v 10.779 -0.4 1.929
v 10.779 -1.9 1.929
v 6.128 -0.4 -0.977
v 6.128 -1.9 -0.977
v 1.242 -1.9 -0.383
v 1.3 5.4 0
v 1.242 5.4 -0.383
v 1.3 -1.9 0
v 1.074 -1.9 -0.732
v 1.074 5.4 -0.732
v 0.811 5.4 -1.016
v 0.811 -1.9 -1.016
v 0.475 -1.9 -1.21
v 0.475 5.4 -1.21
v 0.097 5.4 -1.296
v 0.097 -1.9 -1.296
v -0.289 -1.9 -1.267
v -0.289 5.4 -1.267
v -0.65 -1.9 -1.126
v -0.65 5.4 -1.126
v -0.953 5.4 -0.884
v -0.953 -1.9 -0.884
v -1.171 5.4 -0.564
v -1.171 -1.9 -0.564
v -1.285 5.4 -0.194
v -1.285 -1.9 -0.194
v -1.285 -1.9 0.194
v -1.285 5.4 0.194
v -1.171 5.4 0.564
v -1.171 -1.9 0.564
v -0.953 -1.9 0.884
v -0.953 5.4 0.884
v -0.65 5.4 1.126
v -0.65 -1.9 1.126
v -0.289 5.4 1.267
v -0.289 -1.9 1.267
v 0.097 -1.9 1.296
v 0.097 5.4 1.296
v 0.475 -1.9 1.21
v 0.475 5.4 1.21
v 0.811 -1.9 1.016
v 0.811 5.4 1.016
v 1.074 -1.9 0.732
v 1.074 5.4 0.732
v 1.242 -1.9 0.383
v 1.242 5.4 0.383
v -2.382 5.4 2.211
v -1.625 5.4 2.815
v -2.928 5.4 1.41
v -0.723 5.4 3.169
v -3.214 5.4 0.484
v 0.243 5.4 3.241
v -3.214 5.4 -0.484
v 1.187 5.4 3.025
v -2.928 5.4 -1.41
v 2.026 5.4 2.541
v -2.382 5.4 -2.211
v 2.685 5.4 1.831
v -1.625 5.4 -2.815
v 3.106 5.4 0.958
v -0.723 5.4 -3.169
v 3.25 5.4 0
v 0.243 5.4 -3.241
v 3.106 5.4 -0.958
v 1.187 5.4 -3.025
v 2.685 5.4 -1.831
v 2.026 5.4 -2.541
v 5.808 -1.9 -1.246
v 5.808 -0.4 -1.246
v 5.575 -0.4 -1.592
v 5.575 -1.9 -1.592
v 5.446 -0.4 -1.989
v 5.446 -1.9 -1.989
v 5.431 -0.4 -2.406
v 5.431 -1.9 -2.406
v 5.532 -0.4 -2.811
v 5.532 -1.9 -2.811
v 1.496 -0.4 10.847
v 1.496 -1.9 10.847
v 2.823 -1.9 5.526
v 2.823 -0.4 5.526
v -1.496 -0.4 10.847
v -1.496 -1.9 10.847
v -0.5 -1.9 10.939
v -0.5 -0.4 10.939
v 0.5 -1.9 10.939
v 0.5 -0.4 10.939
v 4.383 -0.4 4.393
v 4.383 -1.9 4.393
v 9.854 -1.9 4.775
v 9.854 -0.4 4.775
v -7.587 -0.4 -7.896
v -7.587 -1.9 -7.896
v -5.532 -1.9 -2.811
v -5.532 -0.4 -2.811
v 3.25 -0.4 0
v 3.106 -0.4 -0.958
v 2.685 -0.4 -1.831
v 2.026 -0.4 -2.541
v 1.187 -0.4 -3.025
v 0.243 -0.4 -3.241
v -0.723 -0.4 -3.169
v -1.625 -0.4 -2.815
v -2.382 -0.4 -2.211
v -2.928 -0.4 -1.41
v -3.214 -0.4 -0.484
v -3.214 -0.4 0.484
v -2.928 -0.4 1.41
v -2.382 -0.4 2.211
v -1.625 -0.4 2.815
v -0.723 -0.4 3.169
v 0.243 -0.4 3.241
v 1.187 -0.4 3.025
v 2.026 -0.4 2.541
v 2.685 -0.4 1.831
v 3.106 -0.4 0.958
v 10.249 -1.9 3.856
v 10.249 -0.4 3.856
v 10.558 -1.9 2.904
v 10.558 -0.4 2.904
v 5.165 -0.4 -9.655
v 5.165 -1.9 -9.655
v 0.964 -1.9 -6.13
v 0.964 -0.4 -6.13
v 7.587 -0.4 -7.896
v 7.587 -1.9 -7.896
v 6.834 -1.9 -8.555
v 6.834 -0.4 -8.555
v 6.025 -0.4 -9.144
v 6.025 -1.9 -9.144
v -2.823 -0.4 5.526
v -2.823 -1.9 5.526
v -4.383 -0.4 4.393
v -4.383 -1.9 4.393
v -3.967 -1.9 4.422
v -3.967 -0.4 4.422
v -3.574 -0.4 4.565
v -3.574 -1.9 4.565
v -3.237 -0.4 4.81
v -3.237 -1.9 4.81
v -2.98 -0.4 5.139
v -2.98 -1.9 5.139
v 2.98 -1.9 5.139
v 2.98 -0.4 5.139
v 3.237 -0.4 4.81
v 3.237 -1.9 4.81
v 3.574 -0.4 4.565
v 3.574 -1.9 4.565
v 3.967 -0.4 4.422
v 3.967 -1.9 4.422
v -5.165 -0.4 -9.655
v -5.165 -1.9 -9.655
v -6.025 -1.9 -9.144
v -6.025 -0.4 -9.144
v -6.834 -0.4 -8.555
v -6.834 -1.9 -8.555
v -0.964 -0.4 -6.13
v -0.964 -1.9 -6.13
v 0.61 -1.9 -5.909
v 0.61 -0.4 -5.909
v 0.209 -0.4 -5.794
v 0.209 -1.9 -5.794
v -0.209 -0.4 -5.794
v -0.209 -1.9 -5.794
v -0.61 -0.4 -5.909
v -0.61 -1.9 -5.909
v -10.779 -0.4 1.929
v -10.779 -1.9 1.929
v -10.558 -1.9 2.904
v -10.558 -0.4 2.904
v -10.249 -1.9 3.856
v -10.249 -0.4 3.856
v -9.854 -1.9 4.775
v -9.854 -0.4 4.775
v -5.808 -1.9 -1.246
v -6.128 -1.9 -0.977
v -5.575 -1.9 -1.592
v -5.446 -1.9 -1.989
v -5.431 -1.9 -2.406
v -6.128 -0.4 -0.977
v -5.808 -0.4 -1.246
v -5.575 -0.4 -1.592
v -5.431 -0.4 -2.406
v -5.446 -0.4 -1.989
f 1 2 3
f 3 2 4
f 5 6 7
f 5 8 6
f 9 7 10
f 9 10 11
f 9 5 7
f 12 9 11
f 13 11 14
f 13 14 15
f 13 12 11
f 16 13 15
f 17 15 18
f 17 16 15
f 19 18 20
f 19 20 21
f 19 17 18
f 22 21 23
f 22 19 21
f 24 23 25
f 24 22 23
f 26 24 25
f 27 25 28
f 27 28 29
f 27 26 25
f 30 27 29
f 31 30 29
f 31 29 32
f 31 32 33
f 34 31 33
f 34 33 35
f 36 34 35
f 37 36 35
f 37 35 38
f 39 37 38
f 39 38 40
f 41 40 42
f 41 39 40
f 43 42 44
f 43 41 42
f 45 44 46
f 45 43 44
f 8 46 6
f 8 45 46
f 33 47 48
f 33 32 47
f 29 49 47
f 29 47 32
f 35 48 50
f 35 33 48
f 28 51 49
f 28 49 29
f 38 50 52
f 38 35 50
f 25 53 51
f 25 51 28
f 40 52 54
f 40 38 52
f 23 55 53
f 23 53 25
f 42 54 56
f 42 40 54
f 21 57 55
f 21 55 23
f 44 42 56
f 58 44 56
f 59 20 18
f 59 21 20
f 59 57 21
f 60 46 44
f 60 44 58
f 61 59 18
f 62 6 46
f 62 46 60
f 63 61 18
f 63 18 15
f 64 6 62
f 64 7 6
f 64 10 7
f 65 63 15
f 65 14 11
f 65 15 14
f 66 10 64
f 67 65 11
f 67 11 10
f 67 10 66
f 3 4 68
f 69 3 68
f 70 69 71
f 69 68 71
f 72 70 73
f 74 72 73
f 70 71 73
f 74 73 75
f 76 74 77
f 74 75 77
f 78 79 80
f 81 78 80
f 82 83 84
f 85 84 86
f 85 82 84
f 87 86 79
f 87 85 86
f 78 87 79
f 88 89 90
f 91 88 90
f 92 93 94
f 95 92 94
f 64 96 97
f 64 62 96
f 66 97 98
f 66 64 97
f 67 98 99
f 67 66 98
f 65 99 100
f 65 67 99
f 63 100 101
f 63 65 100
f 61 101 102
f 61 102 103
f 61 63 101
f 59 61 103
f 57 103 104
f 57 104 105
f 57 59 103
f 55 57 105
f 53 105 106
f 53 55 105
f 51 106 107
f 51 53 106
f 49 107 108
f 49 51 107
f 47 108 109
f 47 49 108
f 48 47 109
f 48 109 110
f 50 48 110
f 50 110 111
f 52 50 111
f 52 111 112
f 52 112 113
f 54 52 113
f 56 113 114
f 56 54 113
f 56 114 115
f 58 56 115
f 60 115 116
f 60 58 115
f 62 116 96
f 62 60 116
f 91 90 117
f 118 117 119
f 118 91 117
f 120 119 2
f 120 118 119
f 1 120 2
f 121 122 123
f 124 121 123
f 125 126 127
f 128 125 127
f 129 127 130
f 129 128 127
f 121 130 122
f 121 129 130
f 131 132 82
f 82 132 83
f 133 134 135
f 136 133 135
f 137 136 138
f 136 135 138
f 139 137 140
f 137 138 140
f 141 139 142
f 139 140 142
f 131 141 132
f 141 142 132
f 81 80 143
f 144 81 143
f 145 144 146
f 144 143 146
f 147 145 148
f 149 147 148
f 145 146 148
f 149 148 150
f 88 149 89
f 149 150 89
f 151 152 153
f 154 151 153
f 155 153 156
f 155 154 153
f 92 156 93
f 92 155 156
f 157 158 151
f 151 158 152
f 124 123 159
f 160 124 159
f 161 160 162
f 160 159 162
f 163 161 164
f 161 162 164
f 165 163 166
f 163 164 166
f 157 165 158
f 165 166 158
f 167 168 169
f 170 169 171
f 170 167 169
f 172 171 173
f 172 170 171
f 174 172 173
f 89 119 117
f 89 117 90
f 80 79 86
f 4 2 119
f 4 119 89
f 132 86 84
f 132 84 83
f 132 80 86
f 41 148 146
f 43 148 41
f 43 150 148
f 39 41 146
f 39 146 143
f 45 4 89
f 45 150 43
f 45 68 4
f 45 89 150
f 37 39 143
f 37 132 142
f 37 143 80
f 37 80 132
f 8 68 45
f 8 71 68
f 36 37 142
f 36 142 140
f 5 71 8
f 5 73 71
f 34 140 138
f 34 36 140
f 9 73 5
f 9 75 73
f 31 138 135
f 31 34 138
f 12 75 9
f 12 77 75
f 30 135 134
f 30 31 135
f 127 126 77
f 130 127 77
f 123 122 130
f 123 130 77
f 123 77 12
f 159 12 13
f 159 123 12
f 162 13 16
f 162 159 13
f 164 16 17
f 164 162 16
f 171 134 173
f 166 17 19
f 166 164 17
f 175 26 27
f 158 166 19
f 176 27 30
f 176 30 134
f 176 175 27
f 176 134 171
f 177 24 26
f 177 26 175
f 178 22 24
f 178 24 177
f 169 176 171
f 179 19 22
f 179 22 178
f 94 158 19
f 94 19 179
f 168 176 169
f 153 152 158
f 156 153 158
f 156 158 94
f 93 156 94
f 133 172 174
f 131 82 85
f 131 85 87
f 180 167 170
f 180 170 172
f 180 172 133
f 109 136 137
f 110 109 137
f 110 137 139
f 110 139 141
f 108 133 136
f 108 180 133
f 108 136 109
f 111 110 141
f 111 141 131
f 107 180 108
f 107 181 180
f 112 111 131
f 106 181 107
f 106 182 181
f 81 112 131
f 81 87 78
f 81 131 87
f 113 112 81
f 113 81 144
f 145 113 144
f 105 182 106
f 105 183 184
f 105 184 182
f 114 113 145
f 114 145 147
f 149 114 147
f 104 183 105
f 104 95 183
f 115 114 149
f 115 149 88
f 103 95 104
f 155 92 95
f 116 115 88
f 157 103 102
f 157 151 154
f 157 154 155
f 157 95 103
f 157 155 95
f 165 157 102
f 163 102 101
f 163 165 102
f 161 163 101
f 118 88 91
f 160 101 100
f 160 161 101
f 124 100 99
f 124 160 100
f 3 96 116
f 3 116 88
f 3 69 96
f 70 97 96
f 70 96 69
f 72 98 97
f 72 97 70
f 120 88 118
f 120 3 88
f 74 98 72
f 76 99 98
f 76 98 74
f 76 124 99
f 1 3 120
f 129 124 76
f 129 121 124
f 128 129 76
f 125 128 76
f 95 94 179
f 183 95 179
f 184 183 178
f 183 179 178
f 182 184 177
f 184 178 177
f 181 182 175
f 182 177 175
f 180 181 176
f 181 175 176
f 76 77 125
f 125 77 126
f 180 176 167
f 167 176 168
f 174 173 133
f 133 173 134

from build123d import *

# Parameters (mm, degrees)
POCKET_DEPTH       = 70.9409245757
POCKET_DEPTH_BACK  = 63.6409245757
POLARPATTERN_COUNT = 5


with BuildPart() as part:
    # Sketch → Revolution (revolve)
    with BuildSketch(Plane.XY):
        Polygon((3.25, 5.4), (1.3, 5.4), (1.3, -1.9), (10.95, -1.9), (10.95, -0.4), (3.25, -0.4), align=None)
    revolve(axis=Axis((0, 0, 0), (0, 1, 0)))

    # Sketch002 (on Face3 of Revolution) → Pocket (cut, two sides)
    with BuildSketch(Plane.XZ.offset(1.9)) as pocket_sk:
        with BuildLine():
            Line((1.4964773799, 10.847260274), (2.8231817433, 5.526139709))
            ThreePointArc((2.8231817433, 5.526139709), (3.3969474543, 4.6754970609), (4.3832600433, 4.392676477))
            Line((4.3832600433, 4.392676477), (9.8539206254, 4.7752223308))
            ThreePointArc((9.8539206254, 4.7752223308), (6.4362485126, 8.8587360884), (1.4964773799, 10.847260274))
        make_face()
    pocket = extrude(amount=-POCKET_DEPTH, mode=Mode.SUBTRACT) + extrude(pocket_sk.sketch, amount=POCKET_DEPTH_BACK, mode=Mode.SUBTRACT)

    # PolarPattern: Pocket ×5 about axis
    polarpattern_axis = Axis((0, -1.9, 0), (0, -1, 0))
    for i in range(1, POLARPATTERN_COUNT):
        add(pocket.rotate(polarpattern_axis, i * 360 / POLARPATTERN_COUNT), mode=Mode.SUBTRACT)


solid = part.part
